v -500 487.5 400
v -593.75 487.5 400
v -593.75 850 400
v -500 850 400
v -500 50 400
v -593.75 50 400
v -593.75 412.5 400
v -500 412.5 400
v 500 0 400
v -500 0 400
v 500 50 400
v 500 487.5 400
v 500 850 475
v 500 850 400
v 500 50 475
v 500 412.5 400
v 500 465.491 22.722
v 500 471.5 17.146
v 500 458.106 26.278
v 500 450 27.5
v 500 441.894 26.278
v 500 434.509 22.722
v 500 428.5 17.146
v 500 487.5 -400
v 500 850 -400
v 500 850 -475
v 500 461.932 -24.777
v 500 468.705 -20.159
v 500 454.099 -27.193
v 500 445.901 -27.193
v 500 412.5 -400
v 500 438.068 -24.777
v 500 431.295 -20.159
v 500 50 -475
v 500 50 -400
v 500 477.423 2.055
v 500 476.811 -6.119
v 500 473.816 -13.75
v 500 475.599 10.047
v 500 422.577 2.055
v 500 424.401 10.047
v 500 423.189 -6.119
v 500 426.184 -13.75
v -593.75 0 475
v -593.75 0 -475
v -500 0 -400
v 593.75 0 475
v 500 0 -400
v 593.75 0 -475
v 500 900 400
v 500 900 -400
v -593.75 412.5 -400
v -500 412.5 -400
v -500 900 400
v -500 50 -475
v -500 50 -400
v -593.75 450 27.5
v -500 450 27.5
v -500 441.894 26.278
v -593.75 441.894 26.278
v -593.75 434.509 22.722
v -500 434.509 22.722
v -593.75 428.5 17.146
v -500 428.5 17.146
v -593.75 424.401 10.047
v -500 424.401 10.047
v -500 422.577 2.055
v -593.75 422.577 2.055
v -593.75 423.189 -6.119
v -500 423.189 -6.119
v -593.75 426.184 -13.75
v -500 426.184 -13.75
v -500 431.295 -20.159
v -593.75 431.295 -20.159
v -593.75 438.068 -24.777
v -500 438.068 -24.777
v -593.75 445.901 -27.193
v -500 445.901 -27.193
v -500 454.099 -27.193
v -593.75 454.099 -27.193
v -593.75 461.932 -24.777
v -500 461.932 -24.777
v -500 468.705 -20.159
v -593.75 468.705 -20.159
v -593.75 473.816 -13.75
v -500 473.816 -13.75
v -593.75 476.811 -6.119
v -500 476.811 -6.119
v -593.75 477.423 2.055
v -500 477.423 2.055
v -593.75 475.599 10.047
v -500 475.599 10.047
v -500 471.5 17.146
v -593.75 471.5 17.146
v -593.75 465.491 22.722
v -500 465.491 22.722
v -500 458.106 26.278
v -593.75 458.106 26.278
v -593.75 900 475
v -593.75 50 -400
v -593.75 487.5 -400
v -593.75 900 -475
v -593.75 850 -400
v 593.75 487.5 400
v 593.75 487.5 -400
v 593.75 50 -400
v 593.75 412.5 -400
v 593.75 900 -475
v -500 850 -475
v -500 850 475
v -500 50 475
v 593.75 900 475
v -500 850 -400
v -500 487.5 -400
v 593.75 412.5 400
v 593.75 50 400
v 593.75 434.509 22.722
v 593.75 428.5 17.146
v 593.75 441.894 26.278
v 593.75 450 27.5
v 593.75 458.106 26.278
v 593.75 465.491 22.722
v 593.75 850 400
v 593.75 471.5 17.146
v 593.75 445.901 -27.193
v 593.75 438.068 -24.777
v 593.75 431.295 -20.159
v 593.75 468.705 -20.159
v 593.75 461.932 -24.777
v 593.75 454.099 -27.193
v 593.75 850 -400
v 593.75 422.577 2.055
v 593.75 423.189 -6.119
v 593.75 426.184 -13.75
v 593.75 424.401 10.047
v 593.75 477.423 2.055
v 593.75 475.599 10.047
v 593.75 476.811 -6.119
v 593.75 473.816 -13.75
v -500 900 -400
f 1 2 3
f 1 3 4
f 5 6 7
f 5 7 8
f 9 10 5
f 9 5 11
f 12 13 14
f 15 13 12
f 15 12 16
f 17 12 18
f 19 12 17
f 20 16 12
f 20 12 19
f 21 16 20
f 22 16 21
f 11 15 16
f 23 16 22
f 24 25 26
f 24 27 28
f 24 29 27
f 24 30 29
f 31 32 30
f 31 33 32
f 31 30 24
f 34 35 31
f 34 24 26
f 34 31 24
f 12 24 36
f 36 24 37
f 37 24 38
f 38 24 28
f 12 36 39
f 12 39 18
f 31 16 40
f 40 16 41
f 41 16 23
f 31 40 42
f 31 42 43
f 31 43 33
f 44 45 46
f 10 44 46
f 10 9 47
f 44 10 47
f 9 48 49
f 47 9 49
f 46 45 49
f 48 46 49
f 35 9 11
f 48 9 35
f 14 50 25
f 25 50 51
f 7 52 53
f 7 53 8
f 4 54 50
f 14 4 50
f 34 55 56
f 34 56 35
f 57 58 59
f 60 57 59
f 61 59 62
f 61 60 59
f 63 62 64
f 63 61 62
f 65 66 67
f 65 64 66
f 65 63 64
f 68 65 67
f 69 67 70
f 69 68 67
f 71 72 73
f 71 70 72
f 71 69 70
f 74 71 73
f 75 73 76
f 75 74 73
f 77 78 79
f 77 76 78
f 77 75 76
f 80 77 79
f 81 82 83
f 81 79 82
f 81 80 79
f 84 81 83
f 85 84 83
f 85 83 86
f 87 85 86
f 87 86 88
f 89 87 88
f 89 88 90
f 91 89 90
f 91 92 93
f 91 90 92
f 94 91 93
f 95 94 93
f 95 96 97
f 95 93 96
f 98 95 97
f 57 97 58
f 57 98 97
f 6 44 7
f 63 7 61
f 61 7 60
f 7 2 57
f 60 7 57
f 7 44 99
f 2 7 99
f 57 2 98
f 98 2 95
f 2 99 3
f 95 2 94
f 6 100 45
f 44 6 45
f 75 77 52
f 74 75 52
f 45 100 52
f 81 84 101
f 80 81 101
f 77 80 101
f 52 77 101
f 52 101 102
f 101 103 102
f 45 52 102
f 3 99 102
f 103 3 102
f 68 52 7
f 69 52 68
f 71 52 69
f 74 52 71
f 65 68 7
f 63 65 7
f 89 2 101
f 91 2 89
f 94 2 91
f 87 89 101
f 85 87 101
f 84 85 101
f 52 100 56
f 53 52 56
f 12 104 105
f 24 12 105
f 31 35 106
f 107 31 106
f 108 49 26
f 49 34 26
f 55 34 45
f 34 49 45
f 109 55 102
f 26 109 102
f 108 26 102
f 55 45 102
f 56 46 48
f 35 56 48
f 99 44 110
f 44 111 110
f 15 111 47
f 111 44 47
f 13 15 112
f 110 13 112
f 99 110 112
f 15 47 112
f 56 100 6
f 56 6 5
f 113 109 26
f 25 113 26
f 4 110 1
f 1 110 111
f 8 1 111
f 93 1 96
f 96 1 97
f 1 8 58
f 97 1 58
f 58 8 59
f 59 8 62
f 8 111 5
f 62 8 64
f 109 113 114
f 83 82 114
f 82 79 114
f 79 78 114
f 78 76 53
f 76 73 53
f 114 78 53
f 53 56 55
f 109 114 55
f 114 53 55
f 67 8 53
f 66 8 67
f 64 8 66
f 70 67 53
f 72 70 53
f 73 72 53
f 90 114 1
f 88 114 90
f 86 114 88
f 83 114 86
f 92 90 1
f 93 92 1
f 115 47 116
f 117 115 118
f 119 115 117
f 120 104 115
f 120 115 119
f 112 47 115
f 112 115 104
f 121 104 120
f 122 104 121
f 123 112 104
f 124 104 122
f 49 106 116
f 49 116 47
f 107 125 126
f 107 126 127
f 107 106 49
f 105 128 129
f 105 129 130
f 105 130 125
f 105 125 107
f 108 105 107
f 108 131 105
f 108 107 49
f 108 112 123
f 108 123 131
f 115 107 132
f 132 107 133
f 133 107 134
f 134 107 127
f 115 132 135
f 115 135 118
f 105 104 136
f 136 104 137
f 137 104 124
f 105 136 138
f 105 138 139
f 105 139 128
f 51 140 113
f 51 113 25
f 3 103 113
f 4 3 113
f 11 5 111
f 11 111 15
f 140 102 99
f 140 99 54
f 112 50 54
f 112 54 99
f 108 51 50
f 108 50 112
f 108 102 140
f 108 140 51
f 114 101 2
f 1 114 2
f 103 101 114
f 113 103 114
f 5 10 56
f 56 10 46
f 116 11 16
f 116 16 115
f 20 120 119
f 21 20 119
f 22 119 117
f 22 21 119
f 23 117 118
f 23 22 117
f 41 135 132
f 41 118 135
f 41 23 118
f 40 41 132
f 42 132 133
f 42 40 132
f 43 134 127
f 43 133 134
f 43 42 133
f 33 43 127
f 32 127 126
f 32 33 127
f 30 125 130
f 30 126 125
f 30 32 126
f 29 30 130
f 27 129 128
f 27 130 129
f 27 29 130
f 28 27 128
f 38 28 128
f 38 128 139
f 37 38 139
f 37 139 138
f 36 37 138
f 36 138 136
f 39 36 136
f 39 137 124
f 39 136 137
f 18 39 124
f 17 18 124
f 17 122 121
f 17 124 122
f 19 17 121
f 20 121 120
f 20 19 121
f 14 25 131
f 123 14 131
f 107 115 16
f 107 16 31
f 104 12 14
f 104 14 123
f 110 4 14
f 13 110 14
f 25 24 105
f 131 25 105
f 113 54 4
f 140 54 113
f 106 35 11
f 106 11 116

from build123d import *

# Parameters (mm, degrees)
SKETCH1_W               = 1187.5
SKETCH1_H               = 950
SKETCH1_W_2             = 1000
SKETCH1_H_2             = 800
BOSS_EXTRUDE1_DEPTH     = 50
SKETCH2_W               = 93.75
SKETCH2_H               = 75
BOSS_EXTRUDE2_DEPTH     = 800
SKETCH3_W               = 950
SKETCH3_H               = 75
BOSS_EXTRUDE3_DEPTH     = 93.75
SKETCH4_W               = 950
SKETCH4_H               = 75
BOSS_EXTRUDE4_DEPTH     = 93.75
CUT_EXTRUDE1_DEPTH      = 2000
CUT_EXTRUDE1_DEPTH_BACK = 2000
SKETCH5_R               = 27.5


with BuildPart() as part:
    # Sketch1 → Boss-Extrude1 (new body)
    with BuildSketch(Plane(origin=(0, 0, 0), x_dir=(1, 0, 0), z_dir=(0, 1, 0))):
        Rectangle(SKETCH1_W, SKETCH1_H)
        Rectangle(SKETCH1_W_2, SKETCH1_H_2, mode=Mode.SUBTRACT)
    boss_extrude1 = extrude(amount=BOSS_EXTRUDE1_DEPTH)

    # Sketch2 → Boss-Extrude2 (add)
    with BuildSketch(Plane(origin=(0, 50, 0), x_dir=(1, 0, 0), z_dir=(0, 1, 0))):
        with Locations((-546.875, 437.5)):
            Rectangle(SKETCH2_W, SKETCH2_H)
        with Locations((-546.875, -437.5)):
            Rectangle(SKETCH2_W, SKETCH2_H)
        with Locations((546.875, 437.5)):
            Rectangle(SKETCH2_W, SKETCH2_H)
        with Locations((546.875, -437.5)):
            Rectangle(SKETCH2_W, SKETCH2_H)
    extrude(amount=BOSS_EXTRUDE2_DEPTH)

    # Mirror1: Boss-Extrude1 across plane
    add(boss_extrude1.mirror(Plane.ZX.offset(450)))

    # Sketch3 → Boss-Extrude3 (add)
    with BuildSketch(Plane(origin=(593.75, 0, 0), x_dir=(0, 0, -1), z_dir=(1, 0, 0))):
        with Locations((0, 450)):
            Rectangle(SKETCH3_W, SKETCH3_H)
    extrude(amount=-BOSS_EXTRUDE3_DEPTH)

    # Sketch4 → Boss-Extrude4 (add)
    with BuildSketch(Plane.ZY.offset(593.75)):
        with Locations((0, 450)):
            Rectangle(SKETCH4_W, SKETCH4_H)
    extrude(amount=-BOSS_EXTRUDE4_DEPTH)

    # Sketch5 → Cut-Extrude1 (cut, two sides: drawn at the far end of the back side and taken through both)
    with BuildSketch(Plane(origin=(593.75, 0, 0), x_dir=(0, 0, -1), z_dir=(1, 0, 0)).offset(-CUT_EXTRUDE1_DEPTH_BACK)):
        with Locations(Location((0, 450, 0), (0, 0, 180))):
            Circle(SKETCH5_R)
    extrude(amount=CUT_EXTRUDE1_DEPTH + CUT_EXTRUDE1_DEPTH_BACK, mode=Mode.SUBTRACT)


solid = part.part
